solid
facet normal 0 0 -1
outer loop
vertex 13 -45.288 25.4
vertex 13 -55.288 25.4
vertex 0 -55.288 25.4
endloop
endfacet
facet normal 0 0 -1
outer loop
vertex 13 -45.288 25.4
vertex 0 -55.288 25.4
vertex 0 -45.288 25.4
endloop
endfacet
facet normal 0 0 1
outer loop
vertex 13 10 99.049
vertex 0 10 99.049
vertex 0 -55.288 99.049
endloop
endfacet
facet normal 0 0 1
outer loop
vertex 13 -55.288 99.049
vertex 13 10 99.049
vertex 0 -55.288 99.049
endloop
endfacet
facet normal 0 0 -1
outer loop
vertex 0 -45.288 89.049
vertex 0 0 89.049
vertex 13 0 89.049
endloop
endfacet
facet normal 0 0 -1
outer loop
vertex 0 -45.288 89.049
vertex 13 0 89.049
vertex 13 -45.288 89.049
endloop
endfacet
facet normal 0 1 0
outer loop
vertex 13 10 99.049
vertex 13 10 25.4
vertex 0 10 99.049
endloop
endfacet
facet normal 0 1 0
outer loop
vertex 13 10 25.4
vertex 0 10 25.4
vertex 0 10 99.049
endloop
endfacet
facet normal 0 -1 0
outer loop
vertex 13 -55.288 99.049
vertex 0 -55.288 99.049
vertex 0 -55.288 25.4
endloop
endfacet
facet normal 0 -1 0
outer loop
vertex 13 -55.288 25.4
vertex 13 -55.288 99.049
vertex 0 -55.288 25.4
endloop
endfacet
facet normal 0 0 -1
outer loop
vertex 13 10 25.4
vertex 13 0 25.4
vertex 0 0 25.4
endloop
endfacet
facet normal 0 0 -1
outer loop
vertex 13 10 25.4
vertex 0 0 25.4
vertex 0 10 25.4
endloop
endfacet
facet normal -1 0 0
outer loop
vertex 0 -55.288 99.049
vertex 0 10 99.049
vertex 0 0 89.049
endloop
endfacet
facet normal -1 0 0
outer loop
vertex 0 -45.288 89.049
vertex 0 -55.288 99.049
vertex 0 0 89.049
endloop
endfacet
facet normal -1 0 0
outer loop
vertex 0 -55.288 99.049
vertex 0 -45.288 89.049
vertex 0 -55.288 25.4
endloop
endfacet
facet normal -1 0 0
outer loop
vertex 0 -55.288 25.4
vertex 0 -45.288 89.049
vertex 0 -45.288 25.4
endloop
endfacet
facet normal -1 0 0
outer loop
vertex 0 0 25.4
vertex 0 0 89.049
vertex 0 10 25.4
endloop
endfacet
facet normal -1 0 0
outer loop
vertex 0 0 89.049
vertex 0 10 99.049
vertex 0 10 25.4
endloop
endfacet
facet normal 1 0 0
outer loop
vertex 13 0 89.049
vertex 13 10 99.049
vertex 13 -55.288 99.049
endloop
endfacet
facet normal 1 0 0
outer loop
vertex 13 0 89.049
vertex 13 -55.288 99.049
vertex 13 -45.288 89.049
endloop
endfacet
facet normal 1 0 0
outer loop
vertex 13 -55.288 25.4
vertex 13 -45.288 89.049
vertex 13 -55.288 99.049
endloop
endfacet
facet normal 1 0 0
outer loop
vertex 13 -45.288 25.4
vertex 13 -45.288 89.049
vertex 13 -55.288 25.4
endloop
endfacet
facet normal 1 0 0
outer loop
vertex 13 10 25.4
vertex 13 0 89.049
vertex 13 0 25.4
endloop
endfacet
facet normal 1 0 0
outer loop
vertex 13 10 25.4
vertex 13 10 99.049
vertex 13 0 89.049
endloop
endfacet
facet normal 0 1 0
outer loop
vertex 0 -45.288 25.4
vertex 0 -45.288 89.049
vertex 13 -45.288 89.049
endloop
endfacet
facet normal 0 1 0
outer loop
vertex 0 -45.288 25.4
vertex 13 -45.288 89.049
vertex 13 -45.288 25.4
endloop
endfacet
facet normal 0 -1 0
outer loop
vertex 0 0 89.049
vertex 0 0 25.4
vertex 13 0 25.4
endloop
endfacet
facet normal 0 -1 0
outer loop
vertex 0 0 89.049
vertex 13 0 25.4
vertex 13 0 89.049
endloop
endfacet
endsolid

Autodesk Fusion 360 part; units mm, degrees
sketch "Sketch1" plane through (0, 0, 0) normal (1, 0, 0) x (0, 0, -1)
  line L0 (-25.4, 25.4) -> (25.4, 25.4)
  line L1 (25.4, 25.4) -> (25.4, -63.5)
  line L2 (25.4, -63.5) -> (-25.4, -63.5)
  line L3 (-25.4, -63.5) -> (-25.4, 25.4)
sketch "Sketch2" plane through (0, 0, 0) normal (1, 0, 0) x (0, 0, -1)
  line L0 (0, 0) -> (-89.049, 0)
  line L1 (-89.049, 0) -> (-89.049, -45.288)
  line L2 (-89.049, -45.288) -> (0, -45.288)
  line L3 (0, -45.288) -> (0, 0)
  line L4 (10, 10) -> (-99.049, 10)
  line L5 (-99.049, 10) -> (-99.049, -55.288)
  line L6 (-99.049, -55.288) -> (10, -55.288)
  line L7 (10, -55.288) -> (10, 10)
  line L8 (-25.4, -63.5) -> (-25.4, 25.4)
  dimension "d1" = 89.049
  dimension "d2" = 45.288
  dimension "d3" = 109.049
  dimension "d4" = 65.288
  dimension "d6" = 10
  dimension "d7" = 10
  dimension "d8" = 25.4
extrude "Extrude1" add sketch "Sketch2" along normal blind 13 contours L0 L2 L3 L4 L6 L7 L8 | L0 L1 L2 L4 L5 L6 L8
extrude "Extrude2" cut sketch "Sketch1" along normal blind 13
sketch "Sketch3" plane through (0, 0, 0) normal (1, 0, 0) x (0, 0, -1)
